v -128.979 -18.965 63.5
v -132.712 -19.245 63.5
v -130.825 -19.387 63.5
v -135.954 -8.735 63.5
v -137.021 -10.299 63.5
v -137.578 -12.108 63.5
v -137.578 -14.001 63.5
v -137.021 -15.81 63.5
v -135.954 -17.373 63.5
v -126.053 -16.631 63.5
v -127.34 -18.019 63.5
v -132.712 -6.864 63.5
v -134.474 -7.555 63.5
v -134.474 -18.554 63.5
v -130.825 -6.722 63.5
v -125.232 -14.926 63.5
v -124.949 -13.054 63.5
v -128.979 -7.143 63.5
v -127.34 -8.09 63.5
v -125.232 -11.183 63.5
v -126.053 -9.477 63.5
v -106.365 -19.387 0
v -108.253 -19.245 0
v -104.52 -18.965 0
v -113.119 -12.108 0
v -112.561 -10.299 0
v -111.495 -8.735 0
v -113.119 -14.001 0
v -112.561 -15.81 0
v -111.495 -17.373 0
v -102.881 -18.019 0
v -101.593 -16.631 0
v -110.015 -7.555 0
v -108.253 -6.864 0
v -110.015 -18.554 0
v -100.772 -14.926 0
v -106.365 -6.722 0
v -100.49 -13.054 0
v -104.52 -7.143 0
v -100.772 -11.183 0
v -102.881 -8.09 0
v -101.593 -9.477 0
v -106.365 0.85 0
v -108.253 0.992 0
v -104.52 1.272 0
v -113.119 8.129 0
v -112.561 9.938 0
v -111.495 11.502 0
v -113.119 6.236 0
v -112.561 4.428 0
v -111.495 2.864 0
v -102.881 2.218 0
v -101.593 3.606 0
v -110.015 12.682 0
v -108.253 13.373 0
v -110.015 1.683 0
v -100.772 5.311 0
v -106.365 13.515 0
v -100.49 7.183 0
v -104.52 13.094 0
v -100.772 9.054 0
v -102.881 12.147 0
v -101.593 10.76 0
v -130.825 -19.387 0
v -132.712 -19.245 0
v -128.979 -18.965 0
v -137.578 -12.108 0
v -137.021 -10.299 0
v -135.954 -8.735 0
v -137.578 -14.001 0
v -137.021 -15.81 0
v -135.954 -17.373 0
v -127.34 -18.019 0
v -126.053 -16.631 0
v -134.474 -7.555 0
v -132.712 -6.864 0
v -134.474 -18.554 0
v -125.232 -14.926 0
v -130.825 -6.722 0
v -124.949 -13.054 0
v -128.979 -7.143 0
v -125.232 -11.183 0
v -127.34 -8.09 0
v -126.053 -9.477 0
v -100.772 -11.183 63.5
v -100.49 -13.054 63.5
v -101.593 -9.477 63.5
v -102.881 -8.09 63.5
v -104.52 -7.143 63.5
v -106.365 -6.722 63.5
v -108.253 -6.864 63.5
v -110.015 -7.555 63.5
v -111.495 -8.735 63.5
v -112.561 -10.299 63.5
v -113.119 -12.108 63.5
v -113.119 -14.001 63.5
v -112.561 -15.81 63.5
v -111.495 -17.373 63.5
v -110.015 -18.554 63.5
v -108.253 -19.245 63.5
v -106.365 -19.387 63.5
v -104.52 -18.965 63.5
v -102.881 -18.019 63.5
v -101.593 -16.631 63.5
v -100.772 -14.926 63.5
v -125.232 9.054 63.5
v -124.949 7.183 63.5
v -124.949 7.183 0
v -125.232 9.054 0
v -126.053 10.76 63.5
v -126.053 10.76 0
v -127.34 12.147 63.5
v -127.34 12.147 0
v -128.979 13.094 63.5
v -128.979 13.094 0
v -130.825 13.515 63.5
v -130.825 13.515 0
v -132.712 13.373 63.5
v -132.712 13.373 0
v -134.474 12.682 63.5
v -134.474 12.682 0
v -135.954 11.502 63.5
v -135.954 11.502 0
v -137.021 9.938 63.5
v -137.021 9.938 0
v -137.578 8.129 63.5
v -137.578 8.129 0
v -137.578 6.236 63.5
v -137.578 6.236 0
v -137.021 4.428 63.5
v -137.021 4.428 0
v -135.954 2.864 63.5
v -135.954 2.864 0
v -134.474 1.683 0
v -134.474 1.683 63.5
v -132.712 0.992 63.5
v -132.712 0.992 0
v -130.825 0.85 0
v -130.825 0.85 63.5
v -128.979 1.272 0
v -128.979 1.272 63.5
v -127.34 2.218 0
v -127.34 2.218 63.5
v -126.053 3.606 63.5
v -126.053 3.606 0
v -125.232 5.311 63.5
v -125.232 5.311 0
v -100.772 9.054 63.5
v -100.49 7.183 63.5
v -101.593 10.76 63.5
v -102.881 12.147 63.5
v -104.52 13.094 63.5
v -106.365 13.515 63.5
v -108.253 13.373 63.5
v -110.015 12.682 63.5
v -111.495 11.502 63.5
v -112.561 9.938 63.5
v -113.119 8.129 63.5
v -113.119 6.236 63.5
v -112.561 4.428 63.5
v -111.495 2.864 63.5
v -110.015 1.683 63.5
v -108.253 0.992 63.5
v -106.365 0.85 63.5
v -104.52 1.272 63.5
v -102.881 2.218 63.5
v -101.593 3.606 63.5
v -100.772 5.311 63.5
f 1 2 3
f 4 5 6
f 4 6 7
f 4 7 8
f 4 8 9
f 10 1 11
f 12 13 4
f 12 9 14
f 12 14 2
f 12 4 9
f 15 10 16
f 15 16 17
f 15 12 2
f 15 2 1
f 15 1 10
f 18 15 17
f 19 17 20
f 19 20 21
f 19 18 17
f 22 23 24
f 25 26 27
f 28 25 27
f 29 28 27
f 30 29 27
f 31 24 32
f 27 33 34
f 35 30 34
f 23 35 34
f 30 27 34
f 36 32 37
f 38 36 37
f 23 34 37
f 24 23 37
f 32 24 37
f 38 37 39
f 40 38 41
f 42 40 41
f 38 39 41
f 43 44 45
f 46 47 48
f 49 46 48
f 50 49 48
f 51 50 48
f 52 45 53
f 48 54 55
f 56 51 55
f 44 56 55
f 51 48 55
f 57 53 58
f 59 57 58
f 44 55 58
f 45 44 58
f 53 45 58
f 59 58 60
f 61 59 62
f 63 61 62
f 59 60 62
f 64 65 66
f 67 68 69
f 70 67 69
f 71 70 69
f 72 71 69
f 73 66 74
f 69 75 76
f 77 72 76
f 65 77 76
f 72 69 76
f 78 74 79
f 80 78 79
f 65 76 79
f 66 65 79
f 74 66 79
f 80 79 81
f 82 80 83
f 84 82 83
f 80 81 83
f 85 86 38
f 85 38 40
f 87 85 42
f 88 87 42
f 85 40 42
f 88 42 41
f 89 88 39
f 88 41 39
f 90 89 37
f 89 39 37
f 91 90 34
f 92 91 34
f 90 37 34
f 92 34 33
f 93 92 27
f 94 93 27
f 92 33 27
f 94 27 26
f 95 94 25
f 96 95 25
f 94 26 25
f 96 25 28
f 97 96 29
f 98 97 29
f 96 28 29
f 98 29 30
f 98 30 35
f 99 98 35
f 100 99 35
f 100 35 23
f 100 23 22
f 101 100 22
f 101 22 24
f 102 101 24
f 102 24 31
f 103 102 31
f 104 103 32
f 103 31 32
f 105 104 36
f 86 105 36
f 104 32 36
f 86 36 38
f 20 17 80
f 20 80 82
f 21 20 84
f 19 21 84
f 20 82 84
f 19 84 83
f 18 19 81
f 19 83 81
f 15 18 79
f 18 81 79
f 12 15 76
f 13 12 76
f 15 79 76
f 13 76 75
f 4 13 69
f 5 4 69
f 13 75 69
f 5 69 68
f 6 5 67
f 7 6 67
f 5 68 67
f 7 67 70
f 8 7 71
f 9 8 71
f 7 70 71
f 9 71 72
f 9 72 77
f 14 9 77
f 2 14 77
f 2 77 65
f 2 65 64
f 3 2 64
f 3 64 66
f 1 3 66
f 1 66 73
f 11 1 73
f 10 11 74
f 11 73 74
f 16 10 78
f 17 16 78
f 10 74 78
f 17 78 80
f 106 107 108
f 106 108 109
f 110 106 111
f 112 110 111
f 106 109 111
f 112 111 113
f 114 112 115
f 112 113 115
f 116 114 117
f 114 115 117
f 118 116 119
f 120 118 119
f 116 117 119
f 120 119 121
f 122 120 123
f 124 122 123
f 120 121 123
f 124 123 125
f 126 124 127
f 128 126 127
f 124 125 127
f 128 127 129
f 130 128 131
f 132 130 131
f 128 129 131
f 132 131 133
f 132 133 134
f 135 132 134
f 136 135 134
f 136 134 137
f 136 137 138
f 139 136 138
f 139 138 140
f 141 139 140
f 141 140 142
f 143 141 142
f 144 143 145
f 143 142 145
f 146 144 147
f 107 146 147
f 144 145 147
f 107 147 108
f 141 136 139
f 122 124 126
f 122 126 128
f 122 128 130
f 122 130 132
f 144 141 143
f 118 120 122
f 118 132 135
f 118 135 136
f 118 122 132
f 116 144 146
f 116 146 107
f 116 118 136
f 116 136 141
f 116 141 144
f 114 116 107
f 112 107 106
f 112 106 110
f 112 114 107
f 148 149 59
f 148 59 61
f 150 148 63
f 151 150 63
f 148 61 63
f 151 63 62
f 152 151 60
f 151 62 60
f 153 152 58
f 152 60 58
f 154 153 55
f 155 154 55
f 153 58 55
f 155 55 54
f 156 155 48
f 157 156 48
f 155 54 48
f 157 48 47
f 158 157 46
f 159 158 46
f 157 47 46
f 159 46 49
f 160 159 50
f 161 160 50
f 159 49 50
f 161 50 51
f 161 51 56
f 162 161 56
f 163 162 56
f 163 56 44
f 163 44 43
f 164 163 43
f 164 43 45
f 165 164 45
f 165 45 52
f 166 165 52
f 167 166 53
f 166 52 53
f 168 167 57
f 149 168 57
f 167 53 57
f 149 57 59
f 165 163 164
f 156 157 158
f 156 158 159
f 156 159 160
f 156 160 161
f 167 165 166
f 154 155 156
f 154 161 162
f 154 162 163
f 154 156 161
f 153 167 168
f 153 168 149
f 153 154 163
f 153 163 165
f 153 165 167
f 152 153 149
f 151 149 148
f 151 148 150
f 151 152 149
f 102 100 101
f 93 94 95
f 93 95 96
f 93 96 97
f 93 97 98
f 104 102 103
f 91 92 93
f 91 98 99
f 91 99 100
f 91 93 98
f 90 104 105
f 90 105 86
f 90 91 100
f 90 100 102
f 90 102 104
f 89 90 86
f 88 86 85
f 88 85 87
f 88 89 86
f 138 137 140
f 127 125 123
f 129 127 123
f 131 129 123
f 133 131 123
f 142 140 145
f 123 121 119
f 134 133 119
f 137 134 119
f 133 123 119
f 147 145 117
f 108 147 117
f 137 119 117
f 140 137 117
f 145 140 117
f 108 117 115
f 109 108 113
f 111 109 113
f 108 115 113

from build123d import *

# Parameters (mm, degrees)
F0_R     = 6.35
F1_DEPTH = 63.5
F2_DEPTH = 63.5


with BuildPart() as f1:
    # F0 (on Top) → F1 (new body)
    with BuildSketch(Plane.XY):
        with Locations((-131.299391, 7.182677)):
            Circle(F0_R)
    extrude(amount=F1_DEPTH)


with BuildPart() as f2:
    # F0 (on Top) → F2 (new body)
    with BuildSketch(Plane.XY):
        with Locations((-106.83988, 7.182677)):
            Circle(F0_R)
        with Locations((-131.299391, -13.054369)):
            Circle(F0_R)
        with Locations((-106.83988, -13.054369)):
            Circle(F0_R)
    extrude(amount=F2_DEPTH)


solid = Compound([f1.part, f2.part])
